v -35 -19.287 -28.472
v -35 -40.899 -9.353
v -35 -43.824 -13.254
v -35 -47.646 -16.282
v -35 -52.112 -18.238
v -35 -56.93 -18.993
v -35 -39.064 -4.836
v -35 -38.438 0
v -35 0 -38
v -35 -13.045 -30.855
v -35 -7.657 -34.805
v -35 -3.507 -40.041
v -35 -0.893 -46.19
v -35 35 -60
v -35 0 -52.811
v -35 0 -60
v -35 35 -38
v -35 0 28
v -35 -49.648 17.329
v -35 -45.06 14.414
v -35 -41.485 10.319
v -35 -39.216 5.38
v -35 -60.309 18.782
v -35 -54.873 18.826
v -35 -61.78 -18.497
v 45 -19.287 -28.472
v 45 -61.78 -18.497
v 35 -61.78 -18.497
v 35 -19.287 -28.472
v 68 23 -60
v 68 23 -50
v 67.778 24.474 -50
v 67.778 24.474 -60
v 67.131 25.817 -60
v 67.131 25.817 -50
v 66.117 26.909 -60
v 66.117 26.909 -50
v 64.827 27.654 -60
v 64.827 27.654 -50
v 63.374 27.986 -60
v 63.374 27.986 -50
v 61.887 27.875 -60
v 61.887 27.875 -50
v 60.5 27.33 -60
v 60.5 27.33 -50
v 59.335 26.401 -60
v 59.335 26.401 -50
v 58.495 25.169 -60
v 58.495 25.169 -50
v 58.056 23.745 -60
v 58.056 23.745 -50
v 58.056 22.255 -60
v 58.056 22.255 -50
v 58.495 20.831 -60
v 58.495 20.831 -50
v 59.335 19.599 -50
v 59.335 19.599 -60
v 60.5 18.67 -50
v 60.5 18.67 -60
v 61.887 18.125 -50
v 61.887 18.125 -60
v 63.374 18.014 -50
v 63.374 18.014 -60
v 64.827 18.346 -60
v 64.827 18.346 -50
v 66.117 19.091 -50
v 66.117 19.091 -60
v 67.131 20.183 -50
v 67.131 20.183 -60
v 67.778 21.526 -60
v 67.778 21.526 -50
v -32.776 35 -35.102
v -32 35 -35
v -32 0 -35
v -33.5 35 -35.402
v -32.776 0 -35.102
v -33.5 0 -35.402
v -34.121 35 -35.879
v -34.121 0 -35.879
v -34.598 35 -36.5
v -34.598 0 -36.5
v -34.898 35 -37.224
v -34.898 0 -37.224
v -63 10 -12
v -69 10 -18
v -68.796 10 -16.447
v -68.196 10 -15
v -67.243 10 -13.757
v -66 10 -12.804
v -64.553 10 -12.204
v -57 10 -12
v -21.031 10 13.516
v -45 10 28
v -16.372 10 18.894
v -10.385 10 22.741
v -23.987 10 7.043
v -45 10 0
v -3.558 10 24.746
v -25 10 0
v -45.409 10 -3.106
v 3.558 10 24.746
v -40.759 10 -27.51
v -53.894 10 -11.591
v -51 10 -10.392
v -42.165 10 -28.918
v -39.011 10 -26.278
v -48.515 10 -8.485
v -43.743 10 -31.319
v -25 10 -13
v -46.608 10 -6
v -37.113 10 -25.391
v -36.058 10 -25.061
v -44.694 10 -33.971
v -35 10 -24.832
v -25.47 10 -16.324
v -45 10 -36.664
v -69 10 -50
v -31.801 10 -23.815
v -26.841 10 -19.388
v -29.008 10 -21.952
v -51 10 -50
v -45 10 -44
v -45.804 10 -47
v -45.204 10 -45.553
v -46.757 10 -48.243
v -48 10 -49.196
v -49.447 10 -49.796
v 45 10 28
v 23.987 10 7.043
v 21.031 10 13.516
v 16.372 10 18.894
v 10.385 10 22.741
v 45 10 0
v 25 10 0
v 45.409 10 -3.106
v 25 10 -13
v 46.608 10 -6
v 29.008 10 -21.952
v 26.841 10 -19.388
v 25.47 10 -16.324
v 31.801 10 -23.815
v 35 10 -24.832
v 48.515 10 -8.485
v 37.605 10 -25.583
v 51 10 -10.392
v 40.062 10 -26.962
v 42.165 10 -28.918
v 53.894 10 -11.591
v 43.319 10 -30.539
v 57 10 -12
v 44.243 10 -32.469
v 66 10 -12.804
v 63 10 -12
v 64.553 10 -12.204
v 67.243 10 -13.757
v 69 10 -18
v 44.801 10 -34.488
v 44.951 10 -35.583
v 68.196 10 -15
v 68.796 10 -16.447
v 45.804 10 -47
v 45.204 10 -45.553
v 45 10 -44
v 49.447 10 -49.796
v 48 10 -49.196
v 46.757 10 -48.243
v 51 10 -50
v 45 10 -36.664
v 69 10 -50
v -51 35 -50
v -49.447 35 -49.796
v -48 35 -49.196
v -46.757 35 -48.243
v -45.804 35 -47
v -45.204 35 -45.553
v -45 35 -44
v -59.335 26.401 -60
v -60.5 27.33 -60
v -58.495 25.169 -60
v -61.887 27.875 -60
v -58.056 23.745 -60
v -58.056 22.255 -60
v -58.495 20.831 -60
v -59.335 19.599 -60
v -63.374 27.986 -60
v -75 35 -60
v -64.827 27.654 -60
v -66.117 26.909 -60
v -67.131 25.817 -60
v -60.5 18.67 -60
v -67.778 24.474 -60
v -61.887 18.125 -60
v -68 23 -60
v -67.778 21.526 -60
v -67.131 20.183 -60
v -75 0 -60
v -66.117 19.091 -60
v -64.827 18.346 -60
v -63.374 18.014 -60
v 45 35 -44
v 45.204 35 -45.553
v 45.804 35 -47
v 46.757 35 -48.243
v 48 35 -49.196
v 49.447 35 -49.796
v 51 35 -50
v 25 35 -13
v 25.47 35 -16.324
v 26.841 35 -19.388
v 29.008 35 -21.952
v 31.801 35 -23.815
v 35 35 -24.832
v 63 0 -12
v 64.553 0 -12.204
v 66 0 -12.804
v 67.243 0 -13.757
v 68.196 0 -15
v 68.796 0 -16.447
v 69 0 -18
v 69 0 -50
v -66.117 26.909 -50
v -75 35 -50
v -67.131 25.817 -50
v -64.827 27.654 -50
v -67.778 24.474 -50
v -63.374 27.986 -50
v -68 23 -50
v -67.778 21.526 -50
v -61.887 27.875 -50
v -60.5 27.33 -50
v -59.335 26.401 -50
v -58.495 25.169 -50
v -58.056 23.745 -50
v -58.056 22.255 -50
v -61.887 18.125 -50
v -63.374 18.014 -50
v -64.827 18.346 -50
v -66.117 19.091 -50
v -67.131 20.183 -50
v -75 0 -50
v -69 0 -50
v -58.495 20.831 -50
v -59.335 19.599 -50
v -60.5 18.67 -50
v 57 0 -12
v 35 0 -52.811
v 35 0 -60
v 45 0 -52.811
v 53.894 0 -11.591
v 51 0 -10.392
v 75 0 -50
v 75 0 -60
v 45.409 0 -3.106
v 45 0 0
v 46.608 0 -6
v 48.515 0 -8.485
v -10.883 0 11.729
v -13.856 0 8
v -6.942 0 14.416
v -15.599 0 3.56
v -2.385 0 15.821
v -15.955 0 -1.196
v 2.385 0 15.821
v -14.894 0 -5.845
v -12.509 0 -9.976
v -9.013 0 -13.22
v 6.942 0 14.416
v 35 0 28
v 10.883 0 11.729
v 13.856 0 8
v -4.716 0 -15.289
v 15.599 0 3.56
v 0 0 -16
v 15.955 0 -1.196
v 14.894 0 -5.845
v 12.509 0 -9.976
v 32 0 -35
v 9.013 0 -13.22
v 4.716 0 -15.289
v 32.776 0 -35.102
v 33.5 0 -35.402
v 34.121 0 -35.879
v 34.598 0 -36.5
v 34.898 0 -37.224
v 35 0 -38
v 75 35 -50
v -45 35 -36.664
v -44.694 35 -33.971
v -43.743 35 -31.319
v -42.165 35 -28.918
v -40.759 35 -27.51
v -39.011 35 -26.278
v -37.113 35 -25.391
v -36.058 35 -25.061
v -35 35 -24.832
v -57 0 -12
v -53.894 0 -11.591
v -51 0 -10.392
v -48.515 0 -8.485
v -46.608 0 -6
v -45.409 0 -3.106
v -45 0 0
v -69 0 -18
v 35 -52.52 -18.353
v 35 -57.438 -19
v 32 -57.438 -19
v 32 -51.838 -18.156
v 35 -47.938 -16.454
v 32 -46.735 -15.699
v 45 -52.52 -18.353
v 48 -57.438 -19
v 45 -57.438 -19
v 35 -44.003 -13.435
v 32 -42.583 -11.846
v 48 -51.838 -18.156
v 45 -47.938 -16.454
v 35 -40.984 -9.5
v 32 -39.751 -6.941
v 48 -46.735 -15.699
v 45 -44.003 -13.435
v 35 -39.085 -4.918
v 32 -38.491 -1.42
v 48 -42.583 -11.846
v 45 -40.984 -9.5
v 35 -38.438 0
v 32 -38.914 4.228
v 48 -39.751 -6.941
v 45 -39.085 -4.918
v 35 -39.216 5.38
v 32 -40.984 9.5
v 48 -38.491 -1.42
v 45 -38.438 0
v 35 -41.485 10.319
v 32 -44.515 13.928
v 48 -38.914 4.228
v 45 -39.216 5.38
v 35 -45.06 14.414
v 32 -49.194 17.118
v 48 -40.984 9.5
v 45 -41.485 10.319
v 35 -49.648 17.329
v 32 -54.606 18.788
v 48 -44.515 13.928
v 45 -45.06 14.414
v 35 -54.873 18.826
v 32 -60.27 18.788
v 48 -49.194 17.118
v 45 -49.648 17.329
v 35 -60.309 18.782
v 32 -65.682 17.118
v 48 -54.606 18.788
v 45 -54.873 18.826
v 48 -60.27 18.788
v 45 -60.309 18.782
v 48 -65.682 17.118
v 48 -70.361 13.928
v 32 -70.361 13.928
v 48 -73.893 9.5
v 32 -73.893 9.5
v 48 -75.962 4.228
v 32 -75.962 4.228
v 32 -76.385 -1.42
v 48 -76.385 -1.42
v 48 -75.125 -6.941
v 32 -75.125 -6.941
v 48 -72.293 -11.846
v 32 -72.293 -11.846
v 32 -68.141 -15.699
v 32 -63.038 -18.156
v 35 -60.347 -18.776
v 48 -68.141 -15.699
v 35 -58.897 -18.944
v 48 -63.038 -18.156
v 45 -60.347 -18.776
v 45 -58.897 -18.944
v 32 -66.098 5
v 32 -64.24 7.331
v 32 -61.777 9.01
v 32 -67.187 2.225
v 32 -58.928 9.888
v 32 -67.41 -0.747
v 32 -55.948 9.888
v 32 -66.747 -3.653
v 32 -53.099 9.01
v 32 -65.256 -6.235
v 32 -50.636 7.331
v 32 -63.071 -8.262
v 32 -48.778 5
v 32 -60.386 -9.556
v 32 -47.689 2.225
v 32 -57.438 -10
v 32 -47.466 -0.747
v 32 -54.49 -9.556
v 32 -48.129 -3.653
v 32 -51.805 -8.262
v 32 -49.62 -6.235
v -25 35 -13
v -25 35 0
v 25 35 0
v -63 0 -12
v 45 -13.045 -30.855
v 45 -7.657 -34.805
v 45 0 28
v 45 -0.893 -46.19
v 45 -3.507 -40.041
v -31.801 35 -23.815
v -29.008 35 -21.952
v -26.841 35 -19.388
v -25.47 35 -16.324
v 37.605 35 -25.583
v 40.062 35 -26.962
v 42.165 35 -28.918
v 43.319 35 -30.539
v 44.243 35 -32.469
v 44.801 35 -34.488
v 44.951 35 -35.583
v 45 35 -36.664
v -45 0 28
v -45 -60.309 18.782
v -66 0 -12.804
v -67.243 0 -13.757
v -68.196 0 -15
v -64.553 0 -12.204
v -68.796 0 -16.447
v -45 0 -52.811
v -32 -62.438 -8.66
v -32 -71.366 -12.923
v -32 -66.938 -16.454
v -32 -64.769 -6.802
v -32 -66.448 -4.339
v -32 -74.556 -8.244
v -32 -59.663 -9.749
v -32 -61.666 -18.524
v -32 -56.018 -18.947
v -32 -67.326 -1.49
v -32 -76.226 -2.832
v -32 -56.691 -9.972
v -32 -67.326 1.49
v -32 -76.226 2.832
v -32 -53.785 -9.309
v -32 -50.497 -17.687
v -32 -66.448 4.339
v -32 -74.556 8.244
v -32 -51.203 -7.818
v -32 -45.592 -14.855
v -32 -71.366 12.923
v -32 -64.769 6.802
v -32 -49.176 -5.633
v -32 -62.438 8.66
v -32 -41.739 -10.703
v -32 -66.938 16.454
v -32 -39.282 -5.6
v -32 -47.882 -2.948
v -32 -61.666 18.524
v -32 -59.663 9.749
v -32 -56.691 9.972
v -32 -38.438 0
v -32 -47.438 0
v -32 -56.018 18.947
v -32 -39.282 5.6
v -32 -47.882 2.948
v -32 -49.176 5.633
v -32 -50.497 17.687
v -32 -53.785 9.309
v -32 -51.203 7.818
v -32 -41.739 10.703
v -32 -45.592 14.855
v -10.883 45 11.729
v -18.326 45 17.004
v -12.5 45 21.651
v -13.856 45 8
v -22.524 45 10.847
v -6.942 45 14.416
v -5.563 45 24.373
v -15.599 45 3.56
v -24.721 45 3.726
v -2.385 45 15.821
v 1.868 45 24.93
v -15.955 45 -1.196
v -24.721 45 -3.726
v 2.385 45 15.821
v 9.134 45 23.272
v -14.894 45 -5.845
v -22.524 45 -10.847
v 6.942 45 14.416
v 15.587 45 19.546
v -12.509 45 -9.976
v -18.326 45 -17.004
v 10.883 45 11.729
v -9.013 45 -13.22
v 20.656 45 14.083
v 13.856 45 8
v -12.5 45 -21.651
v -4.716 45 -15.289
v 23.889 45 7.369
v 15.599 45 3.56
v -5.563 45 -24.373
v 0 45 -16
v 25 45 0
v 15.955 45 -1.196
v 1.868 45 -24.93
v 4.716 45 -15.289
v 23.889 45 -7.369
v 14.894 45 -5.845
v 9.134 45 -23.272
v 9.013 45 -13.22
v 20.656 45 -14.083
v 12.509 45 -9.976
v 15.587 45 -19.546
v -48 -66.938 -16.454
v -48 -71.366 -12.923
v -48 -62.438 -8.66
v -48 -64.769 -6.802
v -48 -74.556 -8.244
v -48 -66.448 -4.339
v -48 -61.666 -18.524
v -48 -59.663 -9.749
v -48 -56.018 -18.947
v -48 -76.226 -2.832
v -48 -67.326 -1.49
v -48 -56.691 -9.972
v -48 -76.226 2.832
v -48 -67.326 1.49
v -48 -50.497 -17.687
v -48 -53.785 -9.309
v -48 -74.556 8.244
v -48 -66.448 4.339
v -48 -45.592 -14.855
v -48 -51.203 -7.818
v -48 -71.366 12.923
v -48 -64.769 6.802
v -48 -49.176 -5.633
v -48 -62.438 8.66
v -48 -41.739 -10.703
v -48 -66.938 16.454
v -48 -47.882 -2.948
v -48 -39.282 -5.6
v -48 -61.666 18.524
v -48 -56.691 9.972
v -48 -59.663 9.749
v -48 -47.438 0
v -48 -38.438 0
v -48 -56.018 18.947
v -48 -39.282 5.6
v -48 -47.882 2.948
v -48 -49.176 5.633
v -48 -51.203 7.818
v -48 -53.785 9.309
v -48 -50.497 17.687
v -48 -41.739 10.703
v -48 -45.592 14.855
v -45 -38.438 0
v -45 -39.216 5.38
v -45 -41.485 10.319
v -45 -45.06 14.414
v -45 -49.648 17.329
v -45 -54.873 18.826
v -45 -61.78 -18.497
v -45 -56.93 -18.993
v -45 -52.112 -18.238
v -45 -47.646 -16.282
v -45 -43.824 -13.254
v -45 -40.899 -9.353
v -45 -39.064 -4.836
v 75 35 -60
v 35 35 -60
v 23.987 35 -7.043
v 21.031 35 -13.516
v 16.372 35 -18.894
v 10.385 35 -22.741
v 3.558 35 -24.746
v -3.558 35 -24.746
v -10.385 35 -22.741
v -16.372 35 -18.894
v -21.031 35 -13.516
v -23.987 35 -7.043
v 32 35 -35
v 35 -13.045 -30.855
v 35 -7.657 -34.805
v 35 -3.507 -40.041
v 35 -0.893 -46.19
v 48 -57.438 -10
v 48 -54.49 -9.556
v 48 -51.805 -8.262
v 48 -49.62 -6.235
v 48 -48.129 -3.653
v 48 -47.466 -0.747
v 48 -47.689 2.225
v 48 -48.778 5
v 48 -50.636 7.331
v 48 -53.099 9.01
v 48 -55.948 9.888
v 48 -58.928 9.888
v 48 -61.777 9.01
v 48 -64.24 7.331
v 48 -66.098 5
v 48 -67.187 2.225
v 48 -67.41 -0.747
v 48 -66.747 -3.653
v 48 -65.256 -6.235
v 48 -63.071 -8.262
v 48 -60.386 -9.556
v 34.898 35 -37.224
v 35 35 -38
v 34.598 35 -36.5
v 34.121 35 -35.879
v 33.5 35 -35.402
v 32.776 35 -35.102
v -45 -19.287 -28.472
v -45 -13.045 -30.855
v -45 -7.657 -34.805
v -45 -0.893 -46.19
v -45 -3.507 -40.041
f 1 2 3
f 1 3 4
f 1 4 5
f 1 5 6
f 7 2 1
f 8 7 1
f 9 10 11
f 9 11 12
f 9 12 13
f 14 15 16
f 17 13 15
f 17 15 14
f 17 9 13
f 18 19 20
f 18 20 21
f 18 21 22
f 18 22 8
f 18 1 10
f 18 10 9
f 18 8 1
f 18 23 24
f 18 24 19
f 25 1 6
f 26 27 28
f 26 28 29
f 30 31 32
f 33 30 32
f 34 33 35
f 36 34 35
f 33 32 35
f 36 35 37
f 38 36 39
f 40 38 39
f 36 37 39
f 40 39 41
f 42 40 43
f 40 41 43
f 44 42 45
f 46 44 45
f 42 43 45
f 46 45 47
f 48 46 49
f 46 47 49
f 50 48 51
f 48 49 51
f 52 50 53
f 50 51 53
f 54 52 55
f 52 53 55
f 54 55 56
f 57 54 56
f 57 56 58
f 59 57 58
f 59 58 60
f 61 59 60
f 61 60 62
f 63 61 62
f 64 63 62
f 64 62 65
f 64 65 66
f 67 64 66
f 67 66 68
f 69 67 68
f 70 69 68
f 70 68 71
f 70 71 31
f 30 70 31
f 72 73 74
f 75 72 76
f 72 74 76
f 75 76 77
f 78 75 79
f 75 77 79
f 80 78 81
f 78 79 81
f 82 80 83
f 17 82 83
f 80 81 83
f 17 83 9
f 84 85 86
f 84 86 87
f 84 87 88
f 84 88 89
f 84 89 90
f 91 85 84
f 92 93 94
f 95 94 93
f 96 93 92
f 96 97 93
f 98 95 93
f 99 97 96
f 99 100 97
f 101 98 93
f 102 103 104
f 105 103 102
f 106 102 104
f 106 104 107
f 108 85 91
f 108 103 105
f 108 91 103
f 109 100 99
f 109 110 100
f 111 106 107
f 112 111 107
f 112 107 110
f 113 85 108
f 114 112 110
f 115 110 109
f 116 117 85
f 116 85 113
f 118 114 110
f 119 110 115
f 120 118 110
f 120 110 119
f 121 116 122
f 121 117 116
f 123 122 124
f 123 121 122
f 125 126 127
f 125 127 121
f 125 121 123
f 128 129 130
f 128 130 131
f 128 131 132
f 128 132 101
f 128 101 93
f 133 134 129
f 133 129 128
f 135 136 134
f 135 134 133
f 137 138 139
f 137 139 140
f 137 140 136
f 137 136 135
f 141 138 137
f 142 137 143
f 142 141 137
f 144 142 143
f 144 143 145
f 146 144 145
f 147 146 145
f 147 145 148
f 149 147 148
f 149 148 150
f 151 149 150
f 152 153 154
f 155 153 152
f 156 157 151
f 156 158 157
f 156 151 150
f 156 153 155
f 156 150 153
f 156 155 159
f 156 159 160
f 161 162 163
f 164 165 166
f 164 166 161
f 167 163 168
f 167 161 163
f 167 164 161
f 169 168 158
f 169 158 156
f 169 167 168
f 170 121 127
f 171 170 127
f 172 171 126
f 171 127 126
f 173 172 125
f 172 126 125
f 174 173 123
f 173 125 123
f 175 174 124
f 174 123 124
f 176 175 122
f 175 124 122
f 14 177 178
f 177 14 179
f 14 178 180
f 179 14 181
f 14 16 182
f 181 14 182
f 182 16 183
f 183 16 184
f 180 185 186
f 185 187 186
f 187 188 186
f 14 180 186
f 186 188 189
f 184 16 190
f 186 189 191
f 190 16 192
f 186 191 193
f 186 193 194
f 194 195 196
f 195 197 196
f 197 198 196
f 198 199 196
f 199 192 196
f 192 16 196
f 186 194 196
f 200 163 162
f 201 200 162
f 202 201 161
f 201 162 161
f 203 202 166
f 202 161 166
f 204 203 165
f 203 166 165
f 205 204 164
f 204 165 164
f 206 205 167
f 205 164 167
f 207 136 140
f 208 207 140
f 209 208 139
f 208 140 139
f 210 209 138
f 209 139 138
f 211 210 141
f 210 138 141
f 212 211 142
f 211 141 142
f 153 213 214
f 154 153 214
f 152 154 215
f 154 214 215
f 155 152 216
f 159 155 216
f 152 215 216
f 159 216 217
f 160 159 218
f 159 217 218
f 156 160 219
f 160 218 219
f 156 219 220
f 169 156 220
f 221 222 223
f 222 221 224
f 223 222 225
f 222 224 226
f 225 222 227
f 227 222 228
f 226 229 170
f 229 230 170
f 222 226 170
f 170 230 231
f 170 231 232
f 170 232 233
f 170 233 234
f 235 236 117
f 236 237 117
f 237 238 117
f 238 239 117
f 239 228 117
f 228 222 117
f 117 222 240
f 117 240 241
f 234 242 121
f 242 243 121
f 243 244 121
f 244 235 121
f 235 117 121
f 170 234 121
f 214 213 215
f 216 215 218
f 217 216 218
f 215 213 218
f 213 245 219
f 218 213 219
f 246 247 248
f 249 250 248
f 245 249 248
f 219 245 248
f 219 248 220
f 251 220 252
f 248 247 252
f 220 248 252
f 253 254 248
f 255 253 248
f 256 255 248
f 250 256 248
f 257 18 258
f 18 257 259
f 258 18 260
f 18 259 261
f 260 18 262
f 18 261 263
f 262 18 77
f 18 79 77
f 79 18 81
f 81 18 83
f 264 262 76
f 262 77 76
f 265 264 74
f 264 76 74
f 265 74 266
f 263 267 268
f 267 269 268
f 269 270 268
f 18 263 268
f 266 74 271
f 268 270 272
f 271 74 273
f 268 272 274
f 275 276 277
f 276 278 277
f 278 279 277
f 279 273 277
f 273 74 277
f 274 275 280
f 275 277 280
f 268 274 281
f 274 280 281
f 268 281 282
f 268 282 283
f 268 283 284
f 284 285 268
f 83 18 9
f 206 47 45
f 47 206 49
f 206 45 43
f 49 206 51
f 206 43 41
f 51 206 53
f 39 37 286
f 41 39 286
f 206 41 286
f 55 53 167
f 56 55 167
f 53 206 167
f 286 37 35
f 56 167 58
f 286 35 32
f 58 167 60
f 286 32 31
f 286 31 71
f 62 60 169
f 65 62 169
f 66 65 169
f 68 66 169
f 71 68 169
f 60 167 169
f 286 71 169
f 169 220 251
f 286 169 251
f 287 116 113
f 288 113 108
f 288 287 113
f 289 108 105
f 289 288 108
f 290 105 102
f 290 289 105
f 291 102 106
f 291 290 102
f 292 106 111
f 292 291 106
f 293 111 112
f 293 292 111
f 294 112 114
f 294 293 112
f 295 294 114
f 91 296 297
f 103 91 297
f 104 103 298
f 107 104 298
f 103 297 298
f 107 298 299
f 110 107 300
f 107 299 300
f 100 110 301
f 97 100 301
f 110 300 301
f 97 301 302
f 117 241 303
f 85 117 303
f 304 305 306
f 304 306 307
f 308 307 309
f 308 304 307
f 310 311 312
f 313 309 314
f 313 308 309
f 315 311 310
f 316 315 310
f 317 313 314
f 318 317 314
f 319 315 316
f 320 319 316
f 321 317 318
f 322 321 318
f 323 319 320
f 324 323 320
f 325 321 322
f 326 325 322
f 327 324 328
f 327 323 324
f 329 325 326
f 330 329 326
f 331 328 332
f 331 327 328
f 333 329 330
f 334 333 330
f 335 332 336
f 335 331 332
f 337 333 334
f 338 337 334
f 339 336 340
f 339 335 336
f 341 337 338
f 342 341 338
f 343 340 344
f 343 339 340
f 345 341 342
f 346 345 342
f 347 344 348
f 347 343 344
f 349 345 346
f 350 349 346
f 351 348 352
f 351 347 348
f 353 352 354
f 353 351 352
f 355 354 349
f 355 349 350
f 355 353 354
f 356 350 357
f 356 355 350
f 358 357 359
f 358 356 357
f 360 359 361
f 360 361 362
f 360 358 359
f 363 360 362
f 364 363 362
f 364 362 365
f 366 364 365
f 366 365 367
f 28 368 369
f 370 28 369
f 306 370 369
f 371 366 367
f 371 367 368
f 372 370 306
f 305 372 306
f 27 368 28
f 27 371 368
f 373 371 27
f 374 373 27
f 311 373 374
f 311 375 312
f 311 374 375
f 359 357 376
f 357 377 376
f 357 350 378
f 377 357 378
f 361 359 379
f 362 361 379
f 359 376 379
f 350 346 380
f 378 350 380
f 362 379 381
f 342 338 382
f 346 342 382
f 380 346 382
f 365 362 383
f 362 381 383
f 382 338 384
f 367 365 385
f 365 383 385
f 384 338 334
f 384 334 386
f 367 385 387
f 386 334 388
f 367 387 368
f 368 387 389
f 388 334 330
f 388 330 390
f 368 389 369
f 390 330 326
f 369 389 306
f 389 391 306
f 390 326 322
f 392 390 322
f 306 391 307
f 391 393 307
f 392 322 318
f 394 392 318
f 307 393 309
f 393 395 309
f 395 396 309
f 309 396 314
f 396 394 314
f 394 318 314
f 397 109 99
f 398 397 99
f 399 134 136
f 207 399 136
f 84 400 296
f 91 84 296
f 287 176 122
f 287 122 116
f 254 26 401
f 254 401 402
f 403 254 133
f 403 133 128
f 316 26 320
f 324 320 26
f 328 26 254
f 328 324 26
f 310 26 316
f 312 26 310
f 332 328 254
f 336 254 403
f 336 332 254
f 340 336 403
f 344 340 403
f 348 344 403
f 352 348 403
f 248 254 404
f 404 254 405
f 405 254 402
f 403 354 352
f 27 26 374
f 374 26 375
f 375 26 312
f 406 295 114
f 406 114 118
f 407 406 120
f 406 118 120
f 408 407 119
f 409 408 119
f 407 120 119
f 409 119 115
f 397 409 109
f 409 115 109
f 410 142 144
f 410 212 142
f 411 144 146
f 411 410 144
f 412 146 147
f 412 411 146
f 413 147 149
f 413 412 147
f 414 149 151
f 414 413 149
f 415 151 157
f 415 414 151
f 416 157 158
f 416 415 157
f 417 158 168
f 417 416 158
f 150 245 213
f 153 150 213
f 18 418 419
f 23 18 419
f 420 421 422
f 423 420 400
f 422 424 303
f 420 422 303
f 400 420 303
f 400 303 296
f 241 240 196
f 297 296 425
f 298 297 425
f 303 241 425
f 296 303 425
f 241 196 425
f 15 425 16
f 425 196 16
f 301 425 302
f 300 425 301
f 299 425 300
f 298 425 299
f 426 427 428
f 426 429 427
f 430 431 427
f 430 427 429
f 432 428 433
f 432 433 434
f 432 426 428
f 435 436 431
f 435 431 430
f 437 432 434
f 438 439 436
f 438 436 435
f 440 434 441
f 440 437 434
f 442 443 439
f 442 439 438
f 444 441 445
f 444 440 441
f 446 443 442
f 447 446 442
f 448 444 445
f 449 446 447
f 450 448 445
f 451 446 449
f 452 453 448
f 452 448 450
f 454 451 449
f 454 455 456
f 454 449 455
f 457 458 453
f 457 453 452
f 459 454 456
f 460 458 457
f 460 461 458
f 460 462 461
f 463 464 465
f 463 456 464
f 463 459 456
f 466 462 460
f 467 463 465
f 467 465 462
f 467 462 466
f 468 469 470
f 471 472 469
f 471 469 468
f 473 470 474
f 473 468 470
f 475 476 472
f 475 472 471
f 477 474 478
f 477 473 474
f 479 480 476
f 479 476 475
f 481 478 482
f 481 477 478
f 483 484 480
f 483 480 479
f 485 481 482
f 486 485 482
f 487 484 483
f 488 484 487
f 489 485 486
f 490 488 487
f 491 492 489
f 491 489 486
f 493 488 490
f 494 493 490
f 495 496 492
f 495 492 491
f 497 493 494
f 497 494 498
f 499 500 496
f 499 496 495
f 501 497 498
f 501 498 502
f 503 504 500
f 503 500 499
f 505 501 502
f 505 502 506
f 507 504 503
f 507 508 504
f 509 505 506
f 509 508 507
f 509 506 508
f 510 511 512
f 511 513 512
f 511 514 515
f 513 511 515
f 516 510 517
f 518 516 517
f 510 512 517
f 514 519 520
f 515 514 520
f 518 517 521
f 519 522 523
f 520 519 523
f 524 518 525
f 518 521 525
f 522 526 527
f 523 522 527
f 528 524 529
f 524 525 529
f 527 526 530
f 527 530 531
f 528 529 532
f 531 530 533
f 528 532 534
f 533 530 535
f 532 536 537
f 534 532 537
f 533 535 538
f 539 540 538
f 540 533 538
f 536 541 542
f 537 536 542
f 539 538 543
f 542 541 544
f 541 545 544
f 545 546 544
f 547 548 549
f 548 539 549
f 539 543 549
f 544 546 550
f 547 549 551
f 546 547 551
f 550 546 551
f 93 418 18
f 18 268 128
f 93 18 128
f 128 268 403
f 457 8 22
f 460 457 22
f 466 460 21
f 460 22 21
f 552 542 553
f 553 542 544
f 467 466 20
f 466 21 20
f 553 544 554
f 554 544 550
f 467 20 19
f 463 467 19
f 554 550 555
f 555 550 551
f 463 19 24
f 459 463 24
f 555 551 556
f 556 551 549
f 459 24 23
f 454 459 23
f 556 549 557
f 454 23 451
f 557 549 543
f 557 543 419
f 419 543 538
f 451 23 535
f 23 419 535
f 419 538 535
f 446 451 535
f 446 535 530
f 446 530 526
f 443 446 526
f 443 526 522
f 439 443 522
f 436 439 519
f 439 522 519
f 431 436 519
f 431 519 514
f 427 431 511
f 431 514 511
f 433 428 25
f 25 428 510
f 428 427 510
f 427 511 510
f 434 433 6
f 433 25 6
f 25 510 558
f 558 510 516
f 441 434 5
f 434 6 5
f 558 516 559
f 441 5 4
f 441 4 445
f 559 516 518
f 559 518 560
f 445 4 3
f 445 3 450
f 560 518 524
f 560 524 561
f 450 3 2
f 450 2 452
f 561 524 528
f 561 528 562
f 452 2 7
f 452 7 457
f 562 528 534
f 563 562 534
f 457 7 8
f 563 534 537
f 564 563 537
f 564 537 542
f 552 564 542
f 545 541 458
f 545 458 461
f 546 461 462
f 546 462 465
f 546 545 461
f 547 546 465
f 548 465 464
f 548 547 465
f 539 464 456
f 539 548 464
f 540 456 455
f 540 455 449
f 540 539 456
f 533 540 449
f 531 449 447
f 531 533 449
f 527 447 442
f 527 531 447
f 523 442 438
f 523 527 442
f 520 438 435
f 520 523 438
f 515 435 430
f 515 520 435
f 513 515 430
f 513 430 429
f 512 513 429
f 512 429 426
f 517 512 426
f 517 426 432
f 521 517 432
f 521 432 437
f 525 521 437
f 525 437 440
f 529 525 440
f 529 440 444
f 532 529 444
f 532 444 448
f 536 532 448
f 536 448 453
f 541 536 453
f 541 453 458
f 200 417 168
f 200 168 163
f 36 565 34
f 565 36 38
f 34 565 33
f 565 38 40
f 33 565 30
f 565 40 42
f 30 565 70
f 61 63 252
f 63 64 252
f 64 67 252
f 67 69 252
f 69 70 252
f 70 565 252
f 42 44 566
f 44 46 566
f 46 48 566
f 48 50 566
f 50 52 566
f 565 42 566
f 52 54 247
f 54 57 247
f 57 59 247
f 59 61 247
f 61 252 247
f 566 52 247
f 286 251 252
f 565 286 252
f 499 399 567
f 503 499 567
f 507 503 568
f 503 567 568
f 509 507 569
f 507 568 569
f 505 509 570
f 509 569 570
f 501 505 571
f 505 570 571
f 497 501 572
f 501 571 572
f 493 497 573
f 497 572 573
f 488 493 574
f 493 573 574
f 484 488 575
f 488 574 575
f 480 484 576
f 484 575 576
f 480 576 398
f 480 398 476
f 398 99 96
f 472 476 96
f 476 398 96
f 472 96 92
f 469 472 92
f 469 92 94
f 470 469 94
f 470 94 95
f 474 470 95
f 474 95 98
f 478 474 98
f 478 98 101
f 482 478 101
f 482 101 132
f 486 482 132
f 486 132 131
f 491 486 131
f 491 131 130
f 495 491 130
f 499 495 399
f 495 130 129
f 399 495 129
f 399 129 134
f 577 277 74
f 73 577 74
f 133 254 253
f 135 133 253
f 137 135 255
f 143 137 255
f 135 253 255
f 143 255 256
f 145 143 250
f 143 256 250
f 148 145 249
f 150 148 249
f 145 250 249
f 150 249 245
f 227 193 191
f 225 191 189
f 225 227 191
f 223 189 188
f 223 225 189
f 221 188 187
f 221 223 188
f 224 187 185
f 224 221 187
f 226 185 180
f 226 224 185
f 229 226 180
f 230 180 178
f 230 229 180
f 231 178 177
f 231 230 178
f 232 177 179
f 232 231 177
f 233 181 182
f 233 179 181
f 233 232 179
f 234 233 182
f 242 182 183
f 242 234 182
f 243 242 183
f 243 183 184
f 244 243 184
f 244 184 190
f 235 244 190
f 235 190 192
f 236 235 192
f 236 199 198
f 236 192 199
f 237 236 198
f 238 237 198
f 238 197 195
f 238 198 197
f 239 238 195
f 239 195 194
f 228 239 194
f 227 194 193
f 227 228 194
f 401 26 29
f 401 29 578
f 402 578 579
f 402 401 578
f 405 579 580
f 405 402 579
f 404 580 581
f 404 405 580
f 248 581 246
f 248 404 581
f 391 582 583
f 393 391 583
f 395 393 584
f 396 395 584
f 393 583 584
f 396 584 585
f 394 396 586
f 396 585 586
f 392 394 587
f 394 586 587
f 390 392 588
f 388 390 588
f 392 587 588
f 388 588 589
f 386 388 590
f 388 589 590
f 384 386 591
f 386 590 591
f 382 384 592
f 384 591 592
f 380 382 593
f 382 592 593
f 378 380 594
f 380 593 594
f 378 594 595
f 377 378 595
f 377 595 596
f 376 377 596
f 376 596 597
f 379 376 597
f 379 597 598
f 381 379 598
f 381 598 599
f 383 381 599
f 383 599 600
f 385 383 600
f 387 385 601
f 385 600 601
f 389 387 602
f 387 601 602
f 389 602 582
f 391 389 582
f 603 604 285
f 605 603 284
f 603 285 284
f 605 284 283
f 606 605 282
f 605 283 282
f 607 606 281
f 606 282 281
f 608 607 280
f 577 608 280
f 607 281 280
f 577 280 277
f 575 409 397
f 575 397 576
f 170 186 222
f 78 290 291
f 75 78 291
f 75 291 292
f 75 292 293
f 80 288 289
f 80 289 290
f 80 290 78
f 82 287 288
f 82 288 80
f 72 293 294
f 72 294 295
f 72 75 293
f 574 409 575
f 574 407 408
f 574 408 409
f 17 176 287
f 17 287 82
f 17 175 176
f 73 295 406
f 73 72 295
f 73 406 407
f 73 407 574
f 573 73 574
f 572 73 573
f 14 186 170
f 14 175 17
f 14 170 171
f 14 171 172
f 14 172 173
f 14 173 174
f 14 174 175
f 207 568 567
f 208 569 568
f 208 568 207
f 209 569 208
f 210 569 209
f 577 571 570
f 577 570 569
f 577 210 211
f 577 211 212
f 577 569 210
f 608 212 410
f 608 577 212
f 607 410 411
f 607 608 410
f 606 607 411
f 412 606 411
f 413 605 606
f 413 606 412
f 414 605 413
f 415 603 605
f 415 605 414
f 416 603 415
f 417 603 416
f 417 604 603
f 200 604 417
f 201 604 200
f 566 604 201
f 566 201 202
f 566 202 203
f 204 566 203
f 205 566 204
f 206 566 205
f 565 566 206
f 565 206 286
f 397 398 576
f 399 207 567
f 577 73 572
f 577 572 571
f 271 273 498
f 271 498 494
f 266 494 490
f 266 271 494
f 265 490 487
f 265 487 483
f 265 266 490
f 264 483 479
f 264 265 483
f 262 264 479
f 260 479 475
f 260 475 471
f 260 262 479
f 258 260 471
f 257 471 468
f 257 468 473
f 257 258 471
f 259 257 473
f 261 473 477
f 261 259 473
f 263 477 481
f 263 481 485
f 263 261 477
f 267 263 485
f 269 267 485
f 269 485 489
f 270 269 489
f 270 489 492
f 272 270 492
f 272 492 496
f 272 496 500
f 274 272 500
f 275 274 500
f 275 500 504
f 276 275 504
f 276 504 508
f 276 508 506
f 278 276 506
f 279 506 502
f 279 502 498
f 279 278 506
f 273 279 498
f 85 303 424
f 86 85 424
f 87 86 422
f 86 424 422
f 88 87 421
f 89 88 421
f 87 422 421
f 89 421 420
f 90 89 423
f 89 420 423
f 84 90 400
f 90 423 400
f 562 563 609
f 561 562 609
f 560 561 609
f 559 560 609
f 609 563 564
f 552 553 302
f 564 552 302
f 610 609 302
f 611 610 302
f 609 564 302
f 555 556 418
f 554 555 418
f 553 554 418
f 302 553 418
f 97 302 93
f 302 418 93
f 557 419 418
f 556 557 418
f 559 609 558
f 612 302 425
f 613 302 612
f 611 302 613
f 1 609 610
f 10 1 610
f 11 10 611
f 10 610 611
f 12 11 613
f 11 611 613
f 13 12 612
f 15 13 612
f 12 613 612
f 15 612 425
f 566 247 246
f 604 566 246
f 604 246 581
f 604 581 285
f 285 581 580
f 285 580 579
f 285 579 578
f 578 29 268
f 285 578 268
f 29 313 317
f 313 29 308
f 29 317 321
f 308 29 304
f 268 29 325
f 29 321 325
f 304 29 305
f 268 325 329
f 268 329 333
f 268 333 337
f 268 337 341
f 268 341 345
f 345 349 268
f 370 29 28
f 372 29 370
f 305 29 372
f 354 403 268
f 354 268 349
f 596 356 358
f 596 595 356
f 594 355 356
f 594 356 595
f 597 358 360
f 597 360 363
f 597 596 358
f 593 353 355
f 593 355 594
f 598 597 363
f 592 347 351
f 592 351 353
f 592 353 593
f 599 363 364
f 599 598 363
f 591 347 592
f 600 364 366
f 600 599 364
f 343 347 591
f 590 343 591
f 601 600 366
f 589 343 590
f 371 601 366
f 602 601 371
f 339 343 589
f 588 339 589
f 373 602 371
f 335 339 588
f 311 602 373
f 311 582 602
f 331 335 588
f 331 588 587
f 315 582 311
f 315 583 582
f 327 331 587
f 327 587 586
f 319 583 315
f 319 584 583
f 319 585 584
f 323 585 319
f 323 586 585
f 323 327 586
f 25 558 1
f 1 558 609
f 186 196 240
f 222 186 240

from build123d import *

# Parameters (mm, degrees)
BOSS_EXTRUDE1_DEPTH   = 10
SKETCH1_3_R           = 25
SKETCH1_3_R_2         = 16
BOSS_EXTRUDE2_DEPTH   = 45
BOSS_EXTRUDE3_DEPTH   = 35
FILLET1_R             = 12
BOSS_EXTRUDE4_DEPTH   = 10
BOSS_EXTRUDE5_START   = 3
SKETCH2_3_R           = 19
SKETCH2_3_R_2         = 10
BOSS_EXTRUDE5_DEPTH   = 16
FILLET2_R             = 25
MIRROR1_START         = -45
MIRROR1_OUTLINE_R     = 10
MIRROR1_DEPTH         = 10
MIRROR1_START_2       = -48
MIRROR1_2_OUTLINE_R   = 19
MIRROR1_2_OUTLINE_R_2 = 10
MIRROR1_2_DEPTH       = 16
SKETCH3_R             = 5
CUT_EXTRUDE1_DEPTH    = 133.483106346


# Read off the part's stored shape, not the designer's step: Mirror1
with BuildPart() as part:
    # Sketch1 → Boss-Extrude1 (new body)
    with BuildSketch(Plane(origin=(0, 0, 0), x_dir=(1, 0, 0), z_dir=(0, 1, 0))):
        with BuildLine():
            Line((-51, 50), (-69, 50))
            Line((-69, 50), (-69, 18))
            ThreePointArc((-69, 18), (-67.242640687, 13.757359313), (-63, 12))
            Line((-63, 12), (-57, 12))
            ThreePointArc((-57, 12), (-48.514718626, 8.485281374), (-45, 0))
            Line((-45, 0), (-45, -28))
            Line((-45, -28), (45, -28))
            Line((45, -28), (45, 0))
            ThreePointArc((45, 0), (48.514718626, 8.485281374), (57, 12))
            Line((57, 12), (63, 12))
            ThreePointArc((63, 12), (67.242640687, 13.757359313), (69, 18))
            Line((69, 18), (69, 50))
            Line((69, 50), (51, 50))
            ThreePointArc((51, 50), (46.757359313, 48.242640687), (45, 44))
            Line((45, 44), (45, 25))
            Line((45, 25), (37, 25))
            ThreePointArc((37, 25), (28.514718626, 21.485281374), (25, 13))
            Line((25, 13), (25, 0))
            ThreePointArc((25, 0), (0, -25), (-25, 0))
            Line((-25, 0), (-25, 13))
            ThreePointArc((-25, 13), (-28.514718626, 21.485281374), (-37, 25))
            Line((-37, 25), (-45, 25))
            Line((-45, 25), (-45, 44))
            ThreePointArc((-45, 44), (-46.757359313, 48.242640687), (-51, 50))
        make_face()
    extrude(amount=BOSS_EXTRUDE1_DEPTH)

    # Sketch1<3> → Boss-Extrude2 (add)
    with BuildSketch(Plane(origin=(0, 0, 0), x_dir=(1, 0, 0), z_dir=(0, 1, 0))):
        Circle(SKETCH1_3_R)
        with Locations(Location((0, 0, 0), (0, 0, 90))):
            Circle(SKETCH1_3_R_2, mode=Mode.SUBTRACT)
    extrude(amount=BOSS_EXTRUDE2_DEPTH)

    # Sketch1<4> → Boss-Extrude3 (add)
    with BuildSketch(Plane(origin=(0, 0, 0), x_dir=(1, 0, 0), z_dir=(0, 1, 0))):
        with BuildLine():
            Line((32, 35), (-32, 35))
            ThreePointArc((-32, 35), (-34.121320344, 35.878679656), (-35, 38))
            Line((-35, 38), (-35, 60))
            Line((-35, 60), (-75, 60))
            Line((-75, 60), (-75, 50))
            Line((-75, 50), (-69, 50))
            Line((-69, 50), (-51, 50))
            ThreePointArc((-51, 50), (-46.757359313, 48.242640687), (-45, 44))
            Line((-45, 44), (-45, 25))
            Line((-45, 25), (-37, 25))
            ThreePointArc((-37, 25), (-28.514718626, 21.485281374), (-25, 13))
            Line((-25, 13), (-25, 0))
            ThreePointArc((-25, 0), (0, 25), (25, 0))
            Line((25, 0), (25, 13))
            ThreePointArc((25, 13), (28.514718626, 21.485281374), (37, 25))
            Line((37, 25), (45, 25))
            Line((45, 25), (45, 44))
            ThreePointArc((45, 44), (46.757359313, 48.242640687), (51, 50))
            Line((51, 50), (69, 50))
            Line((69, 50), (75, 50))
            Line((75, 50), (75, 60))
            Line((75, 60), (35, 60))
            Line((35, 60), (35, 38))
            ThreePointArc((35, 38), (34.121320344, 35.878679656), (32, 35))
        make_face()
    extrude(amount=BOSS_EXTRUDE3_DEPTH)

    # Fillet1
    fillet1_edges = [part.edges().sort_by_distance(p)[0] for p in [
        (-45, 22.5, -25),
        (45, 22.5, -25),
    ]]
    fillet(fillet1_edges, radius=FILLET1_R)

    # Sketch2 → Boss-Extrude4 (add)
    with BuildSketch(Plane(origin=(45, 0, 0), x_dir=(0, 0, -1), z_dir=(1, 0, 0))):
        with BuildLine():
            Line((0, 0), (-28, 0))
            Line((-28, 0), (-18.781868567, -60.308822731))
            ThreePointArc((-18.781868567, -60.308822731), (-14.414314705, -45.059525702), (0, -38.438036581))
            Line((0, -38.438036581), (0, 0))
        make_face()
        with BuildLine():
            Line((33, 0), (0, 0))
            Line((0, 0), (0, -38.438036581))
            ThreePointArc((0, -38.438036581), (13.435028843, -44.003007739), (19, -57.438036581))
            ThreePointArc((19, -57.438036581), (18.873874635, -59.623638617), (18.497173025, -61.780223826))
            Line((18.497173025, -61.780223826), (33, 0))
        make_face()
    extrude(amount=-BOSS_EXTRUDE4_DEPTH)

    # Sketch2<3> → Boss-Extrude5 (add)
    with BuildSketch(Plane(origin=(45, 0, 0), x_dir=(0, 0, -1), z_dir=(1, 0, 0)).offset(BOSS_EXTRUDE5_START)):
        with Locations((0, -57.438036581)):
            Circle(SKETCH2_3_R)
        with Locations((0, -57.438036581)):
            Circle(SKETCH2_3_R_2, mode=Mode.SUBTRACT)
    extrude(amount=-BOSS_EXTRUDE5_DEPTH)

    # Fillet2
    # the kernel refuses this fillet: 25 mm, written as the material it adds along each edge
    with BuildSketch(Plane(origin=(45, 0, -33), x_dir=(0, 0, -1), z_dir=(-1, 0, 0))) as fillet2_piece_1:
        with BuildLine():
            CenterArc((FILLET2_R * 0.792435294557, FILLET2_R), FILLET2_R, 193.210905315, 76.789094685)
            Line((-FILLET2_R * 0.181100127826, FILLET2_R * 0.771463829198), (0, 0))
            Line((0, 0), (FILLET2_R * 0.792435294557, 0))
        make_face()
    extrude(amount=10)

    # Mirror1 outline → Mirror1 (add)
    with BuildSketch(Plane.YZ.offset(MIRROR1_START)):
        with BuildLine():
            Line((0, 28), (-60.308822731, 18.781868567))
            ThreePointArc((-60.308822731, 18.781868567), (-76.423254036, 0.74934517), (-61.780223826, -18.497173025))
            Line((-61.780223826, -18.497173025), (-19.28659573, -28.472496804))
            ThreePointArc((-19.28659573, -28.472496804), (-5.406185839, -37.284052468), (0, -52.810882364))
            Line((0, -52.810882364), (0, 28))
        make_face()
        with Locations((-57.438036581, 0)):
            Circle(MIRROR1_OUTLINE_R, mode=Mode.SUBTRACT)
    extrude(amount=MIRROR1_DEPTH)

    # Mirror1 2 outline → Mirror1 2 (add)
    with BuildSketch(Plane.YZ.offset(MIRROR1_START_2)):
        with Locations((-57.438036581, 0)):
            Circle(MIRROR1_2_OUTLINE_R)
        with Locations((-57.438036581, 0)):
            Circle(MIRROR1_2_OUTLINE_R_2, mode=Mode.SUBTRACT)
    extrude(amount=MIRROR1_2_DEPTH)

    # Sketch3 → Cut-Extrude1 (cut, through all)
    with BuildSketch(Plane.XY.offset(-50)):
        with Locations((63, 23)):
            Circle(SKETCH3_R)
    cut_extrude1 = extrude(amount=-CUT_EXTRUDE1_DEPTH, mode=Mode.SUBTRACT)

    # Mirror2: Cut-Extrude1 across plane
    add(cut_extrude1.mirror(Plane(origin=(0, 0, 0), x_dir=(0, 0, 1), z_dir=(1, 0, 0))), mode=Mode.SUBTRACT)


solid = part.part
